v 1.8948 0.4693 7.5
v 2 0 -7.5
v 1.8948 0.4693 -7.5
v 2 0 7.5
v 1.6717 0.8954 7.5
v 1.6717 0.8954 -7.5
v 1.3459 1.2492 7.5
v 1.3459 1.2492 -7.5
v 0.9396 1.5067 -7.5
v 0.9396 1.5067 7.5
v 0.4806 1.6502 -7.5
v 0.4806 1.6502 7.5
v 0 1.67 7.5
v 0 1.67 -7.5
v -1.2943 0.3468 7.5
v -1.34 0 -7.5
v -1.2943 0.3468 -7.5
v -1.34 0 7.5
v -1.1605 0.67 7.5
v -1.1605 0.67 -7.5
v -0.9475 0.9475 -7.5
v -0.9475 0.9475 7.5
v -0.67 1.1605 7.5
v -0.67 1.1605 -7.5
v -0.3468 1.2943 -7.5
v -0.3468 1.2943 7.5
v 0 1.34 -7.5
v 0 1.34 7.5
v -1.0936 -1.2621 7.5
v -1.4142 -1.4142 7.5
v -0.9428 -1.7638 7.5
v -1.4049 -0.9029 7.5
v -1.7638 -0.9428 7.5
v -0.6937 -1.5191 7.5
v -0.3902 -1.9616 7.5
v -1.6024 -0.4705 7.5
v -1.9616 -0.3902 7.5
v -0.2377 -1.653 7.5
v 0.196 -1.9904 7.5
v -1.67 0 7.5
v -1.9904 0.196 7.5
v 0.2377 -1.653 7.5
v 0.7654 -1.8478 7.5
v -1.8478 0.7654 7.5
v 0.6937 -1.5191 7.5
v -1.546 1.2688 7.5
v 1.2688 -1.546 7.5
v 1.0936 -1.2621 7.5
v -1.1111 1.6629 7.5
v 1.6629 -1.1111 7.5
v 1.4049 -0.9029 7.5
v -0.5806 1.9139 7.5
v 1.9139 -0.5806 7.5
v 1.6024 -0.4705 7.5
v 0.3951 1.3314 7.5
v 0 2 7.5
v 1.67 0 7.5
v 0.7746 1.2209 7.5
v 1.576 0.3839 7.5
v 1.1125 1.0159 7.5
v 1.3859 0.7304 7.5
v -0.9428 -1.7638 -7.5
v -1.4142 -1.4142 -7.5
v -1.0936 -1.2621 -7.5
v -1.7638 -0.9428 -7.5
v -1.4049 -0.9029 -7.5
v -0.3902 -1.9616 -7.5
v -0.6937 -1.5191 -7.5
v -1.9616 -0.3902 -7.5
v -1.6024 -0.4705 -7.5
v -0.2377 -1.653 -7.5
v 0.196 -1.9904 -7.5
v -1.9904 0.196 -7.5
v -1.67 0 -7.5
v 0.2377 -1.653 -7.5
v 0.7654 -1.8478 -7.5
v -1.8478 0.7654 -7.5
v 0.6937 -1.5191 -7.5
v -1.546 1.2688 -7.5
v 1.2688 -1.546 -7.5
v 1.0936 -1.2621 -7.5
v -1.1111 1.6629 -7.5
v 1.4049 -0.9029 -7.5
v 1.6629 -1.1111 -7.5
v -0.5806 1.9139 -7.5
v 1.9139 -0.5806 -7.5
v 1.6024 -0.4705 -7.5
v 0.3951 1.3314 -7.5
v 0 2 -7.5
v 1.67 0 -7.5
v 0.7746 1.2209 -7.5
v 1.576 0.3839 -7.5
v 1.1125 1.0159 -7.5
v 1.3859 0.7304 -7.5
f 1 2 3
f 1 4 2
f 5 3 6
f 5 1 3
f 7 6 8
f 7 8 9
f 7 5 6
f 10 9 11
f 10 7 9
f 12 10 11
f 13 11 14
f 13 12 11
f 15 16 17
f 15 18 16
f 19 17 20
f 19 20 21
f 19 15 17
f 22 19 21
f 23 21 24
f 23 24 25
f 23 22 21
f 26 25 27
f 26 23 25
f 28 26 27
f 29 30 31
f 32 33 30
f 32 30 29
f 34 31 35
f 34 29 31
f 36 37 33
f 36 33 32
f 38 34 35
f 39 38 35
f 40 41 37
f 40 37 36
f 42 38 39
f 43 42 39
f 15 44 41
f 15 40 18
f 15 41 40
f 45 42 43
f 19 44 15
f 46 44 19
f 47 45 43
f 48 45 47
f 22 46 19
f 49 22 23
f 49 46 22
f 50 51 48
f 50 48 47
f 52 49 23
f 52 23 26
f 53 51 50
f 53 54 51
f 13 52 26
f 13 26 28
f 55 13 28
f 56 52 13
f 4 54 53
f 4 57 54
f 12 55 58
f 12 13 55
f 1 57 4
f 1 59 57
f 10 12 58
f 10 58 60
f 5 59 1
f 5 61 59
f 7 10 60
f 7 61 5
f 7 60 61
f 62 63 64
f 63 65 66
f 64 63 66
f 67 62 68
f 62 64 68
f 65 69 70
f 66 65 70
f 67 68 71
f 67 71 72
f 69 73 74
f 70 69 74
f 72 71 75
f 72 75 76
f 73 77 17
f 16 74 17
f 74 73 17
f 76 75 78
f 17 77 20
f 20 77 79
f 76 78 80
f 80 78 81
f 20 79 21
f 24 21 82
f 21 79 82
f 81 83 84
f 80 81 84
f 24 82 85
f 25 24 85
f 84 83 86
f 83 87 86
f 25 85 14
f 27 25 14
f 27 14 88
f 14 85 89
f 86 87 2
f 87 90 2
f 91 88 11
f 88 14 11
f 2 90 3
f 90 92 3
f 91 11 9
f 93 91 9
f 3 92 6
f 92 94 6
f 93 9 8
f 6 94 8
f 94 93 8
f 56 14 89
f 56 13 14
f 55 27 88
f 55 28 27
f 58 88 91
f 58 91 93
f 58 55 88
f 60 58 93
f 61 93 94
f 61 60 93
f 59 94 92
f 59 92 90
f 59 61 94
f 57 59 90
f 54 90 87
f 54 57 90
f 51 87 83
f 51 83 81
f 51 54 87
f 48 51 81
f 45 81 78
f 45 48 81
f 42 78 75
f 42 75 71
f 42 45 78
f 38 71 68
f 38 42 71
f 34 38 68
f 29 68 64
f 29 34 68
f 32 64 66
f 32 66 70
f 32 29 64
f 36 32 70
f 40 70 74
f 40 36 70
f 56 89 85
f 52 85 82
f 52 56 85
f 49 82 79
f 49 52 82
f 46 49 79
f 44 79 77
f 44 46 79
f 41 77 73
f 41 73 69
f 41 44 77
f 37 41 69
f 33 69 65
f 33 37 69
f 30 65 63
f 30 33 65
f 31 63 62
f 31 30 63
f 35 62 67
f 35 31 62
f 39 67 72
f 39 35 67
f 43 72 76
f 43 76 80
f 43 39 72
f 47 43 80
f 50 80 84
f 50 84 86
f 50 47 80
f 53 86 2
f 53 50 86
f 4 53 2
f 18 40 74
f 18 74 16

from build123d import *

# Parameters (mm, degrees)
BASE_EXTRUDE_DEPTH = 7.5


with BuildPart() as part:
    # Sketch1 → Base-Extrude (new body, symmetric)
    with BuildSketch(Plane.XY):
        with BuildLine():
            Line((0, 1.67), (0, 2))
            ThreePointArc((0, 2), (-1.414213562, -1.414213562), (2, 0))
            ThreePointArc((2, 0), (1.345868325, 1.249213562), (0, 1.67))
        make_face()
        with BuildLine():
            Line((-1.67, 0), (-1.34, 0))
            ThreePointArc((-1.34, 0), (-0.947523087, 0.947523087), (0, 1.34))
            ThreePointArc((0, 1.34), (1.112523087, 1.015868325), (1.67, 0))
            ThreePointArc((1.67, 0), (0, -1.67), (-1.67, 0))
        make_face(mode=Mode.SUBTRACT)
    extrude(amount=BASE_EXTRUDE_DEPTH, both=True)


solid = part.part
